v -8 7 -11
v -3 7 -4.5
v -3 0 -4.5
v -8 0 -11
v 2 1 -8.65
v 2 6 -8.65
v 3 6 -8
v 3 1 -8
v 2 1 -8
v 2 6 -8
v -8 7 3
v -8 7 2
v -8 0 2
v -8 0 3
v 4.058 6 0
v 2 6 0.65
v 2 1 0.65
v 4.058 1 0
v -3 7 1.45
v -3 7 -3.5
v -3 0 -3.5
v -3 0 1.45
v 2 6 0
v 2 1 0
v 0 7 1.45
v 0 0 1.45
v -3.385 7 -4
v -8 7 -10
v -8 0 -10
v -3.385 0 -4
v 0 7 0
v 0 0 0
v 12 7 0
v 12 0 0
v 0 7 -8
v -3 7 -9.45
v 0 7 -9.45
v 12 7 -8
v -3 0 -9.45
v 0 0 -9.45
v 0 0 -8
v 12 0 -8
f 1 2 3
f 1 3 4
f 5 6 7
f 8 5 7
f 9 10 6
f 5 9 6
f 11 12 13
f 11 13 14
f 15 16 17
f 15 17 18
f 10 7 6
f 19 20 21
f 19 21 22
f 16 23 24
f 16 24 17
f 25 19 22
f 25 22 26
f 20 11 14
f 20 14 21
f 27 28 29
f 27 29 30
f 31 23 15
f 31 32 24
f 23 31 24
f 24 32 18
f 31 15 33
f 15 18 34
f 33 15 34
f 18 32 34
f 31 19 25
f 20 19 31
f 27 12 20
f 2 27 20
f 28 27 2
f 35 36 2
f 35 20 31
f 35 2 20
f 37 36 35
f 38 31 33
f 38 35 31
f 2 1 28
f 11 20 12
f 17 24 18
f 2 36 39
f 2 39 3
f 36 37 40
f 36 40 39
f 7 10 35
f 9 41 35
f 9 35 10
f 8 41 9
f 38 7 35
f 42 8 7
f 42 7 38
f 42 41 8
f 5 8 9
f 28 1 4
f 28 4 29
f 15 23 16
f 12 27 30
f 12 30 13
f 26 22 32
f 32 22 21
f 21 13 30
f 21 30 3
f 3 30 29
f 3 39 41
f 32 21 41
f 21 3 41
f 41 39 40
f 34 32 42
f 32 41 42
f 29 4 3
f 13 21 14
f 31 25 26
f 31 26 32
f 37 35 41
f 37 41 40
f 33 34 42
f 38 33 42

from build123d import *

# Parameters (mm, degrees)
SKETCH_1_W      = 12
SKETCH_1_H      = 8
EXTRUDE_1_DEPTH = 7
EXTRUDE_2_DEPTH = 7
EXTRUDE_5_DEPTH = 7
EXTRUDE_START   = -1
EXTRUDE_6_DEPTH = 5


with BuildPart() as part:
    # 草图1 → 凸台-拉伸1 (new body)
    with BuildSketch(Plane(origin=(0, 0, 0), x_dir=(1, 0, 0), z_dir=(0, 1, 0))):
        with Locations((6, 4)):
            Rectangle(SKETCH_1_W, SKETCH_1_H)
    extrude(amount=EXTRUDE_1_DEPTH)

    # 草图2 → 凸台-拉伸2 (add)
    with BuildSketch(Plane(origin=(0, 7, 0), x_dir=(1, 0, 0), z_dir=(0, 1, 0))):
        Polygon((-3, -1.45), (0, -1.45), (0, 0), (0, 4), (-3, 4), align=None)
        Polygon((-3, 9.45), (-3, 4), (0, 4), (0, 8), (0, 9.45), align=None)
    extrude(amount=-EXTRUDE_2_DEPTH)

    # 草图3 → 凸台-拉伸5 (add)
    with BuildSketch(Plane(origin=(0, 7, 0), x_dir=(1, 0, 0), z_dir=(0, 1, 0))):
        Polygon((-3.384615385, 4), (-3, 4.5), (-8, 11), (-8, 10), align=None)
        Polygon((-3, 3.5), (-3.384615385, 4), (-8, -2), (-8, -3), align=None)
        Polygon((-3, 3.5), (-3, 4.5), (-3.384615385, 4), align=None)
    extrude(amount=-EXTRUDE_5_DEPTH)

    # 草图4 → 凸台-拉伸6 (add)
    with BuildSketch(Plane(origin=(0, 7, 0), x_dir=(1, 0, 0), z_dir=(0, 1, 0)).offset(EXTRUDE_START)):
        Polygon((2, 8), (2, 8.65), (3, 8), align=None)
        Polygon((2, 0), (2, -0.65), (4.058075402, 0), align=None)
    extrude(amount=-EXTRUDE_6_DEPTH)


solid = part.part
